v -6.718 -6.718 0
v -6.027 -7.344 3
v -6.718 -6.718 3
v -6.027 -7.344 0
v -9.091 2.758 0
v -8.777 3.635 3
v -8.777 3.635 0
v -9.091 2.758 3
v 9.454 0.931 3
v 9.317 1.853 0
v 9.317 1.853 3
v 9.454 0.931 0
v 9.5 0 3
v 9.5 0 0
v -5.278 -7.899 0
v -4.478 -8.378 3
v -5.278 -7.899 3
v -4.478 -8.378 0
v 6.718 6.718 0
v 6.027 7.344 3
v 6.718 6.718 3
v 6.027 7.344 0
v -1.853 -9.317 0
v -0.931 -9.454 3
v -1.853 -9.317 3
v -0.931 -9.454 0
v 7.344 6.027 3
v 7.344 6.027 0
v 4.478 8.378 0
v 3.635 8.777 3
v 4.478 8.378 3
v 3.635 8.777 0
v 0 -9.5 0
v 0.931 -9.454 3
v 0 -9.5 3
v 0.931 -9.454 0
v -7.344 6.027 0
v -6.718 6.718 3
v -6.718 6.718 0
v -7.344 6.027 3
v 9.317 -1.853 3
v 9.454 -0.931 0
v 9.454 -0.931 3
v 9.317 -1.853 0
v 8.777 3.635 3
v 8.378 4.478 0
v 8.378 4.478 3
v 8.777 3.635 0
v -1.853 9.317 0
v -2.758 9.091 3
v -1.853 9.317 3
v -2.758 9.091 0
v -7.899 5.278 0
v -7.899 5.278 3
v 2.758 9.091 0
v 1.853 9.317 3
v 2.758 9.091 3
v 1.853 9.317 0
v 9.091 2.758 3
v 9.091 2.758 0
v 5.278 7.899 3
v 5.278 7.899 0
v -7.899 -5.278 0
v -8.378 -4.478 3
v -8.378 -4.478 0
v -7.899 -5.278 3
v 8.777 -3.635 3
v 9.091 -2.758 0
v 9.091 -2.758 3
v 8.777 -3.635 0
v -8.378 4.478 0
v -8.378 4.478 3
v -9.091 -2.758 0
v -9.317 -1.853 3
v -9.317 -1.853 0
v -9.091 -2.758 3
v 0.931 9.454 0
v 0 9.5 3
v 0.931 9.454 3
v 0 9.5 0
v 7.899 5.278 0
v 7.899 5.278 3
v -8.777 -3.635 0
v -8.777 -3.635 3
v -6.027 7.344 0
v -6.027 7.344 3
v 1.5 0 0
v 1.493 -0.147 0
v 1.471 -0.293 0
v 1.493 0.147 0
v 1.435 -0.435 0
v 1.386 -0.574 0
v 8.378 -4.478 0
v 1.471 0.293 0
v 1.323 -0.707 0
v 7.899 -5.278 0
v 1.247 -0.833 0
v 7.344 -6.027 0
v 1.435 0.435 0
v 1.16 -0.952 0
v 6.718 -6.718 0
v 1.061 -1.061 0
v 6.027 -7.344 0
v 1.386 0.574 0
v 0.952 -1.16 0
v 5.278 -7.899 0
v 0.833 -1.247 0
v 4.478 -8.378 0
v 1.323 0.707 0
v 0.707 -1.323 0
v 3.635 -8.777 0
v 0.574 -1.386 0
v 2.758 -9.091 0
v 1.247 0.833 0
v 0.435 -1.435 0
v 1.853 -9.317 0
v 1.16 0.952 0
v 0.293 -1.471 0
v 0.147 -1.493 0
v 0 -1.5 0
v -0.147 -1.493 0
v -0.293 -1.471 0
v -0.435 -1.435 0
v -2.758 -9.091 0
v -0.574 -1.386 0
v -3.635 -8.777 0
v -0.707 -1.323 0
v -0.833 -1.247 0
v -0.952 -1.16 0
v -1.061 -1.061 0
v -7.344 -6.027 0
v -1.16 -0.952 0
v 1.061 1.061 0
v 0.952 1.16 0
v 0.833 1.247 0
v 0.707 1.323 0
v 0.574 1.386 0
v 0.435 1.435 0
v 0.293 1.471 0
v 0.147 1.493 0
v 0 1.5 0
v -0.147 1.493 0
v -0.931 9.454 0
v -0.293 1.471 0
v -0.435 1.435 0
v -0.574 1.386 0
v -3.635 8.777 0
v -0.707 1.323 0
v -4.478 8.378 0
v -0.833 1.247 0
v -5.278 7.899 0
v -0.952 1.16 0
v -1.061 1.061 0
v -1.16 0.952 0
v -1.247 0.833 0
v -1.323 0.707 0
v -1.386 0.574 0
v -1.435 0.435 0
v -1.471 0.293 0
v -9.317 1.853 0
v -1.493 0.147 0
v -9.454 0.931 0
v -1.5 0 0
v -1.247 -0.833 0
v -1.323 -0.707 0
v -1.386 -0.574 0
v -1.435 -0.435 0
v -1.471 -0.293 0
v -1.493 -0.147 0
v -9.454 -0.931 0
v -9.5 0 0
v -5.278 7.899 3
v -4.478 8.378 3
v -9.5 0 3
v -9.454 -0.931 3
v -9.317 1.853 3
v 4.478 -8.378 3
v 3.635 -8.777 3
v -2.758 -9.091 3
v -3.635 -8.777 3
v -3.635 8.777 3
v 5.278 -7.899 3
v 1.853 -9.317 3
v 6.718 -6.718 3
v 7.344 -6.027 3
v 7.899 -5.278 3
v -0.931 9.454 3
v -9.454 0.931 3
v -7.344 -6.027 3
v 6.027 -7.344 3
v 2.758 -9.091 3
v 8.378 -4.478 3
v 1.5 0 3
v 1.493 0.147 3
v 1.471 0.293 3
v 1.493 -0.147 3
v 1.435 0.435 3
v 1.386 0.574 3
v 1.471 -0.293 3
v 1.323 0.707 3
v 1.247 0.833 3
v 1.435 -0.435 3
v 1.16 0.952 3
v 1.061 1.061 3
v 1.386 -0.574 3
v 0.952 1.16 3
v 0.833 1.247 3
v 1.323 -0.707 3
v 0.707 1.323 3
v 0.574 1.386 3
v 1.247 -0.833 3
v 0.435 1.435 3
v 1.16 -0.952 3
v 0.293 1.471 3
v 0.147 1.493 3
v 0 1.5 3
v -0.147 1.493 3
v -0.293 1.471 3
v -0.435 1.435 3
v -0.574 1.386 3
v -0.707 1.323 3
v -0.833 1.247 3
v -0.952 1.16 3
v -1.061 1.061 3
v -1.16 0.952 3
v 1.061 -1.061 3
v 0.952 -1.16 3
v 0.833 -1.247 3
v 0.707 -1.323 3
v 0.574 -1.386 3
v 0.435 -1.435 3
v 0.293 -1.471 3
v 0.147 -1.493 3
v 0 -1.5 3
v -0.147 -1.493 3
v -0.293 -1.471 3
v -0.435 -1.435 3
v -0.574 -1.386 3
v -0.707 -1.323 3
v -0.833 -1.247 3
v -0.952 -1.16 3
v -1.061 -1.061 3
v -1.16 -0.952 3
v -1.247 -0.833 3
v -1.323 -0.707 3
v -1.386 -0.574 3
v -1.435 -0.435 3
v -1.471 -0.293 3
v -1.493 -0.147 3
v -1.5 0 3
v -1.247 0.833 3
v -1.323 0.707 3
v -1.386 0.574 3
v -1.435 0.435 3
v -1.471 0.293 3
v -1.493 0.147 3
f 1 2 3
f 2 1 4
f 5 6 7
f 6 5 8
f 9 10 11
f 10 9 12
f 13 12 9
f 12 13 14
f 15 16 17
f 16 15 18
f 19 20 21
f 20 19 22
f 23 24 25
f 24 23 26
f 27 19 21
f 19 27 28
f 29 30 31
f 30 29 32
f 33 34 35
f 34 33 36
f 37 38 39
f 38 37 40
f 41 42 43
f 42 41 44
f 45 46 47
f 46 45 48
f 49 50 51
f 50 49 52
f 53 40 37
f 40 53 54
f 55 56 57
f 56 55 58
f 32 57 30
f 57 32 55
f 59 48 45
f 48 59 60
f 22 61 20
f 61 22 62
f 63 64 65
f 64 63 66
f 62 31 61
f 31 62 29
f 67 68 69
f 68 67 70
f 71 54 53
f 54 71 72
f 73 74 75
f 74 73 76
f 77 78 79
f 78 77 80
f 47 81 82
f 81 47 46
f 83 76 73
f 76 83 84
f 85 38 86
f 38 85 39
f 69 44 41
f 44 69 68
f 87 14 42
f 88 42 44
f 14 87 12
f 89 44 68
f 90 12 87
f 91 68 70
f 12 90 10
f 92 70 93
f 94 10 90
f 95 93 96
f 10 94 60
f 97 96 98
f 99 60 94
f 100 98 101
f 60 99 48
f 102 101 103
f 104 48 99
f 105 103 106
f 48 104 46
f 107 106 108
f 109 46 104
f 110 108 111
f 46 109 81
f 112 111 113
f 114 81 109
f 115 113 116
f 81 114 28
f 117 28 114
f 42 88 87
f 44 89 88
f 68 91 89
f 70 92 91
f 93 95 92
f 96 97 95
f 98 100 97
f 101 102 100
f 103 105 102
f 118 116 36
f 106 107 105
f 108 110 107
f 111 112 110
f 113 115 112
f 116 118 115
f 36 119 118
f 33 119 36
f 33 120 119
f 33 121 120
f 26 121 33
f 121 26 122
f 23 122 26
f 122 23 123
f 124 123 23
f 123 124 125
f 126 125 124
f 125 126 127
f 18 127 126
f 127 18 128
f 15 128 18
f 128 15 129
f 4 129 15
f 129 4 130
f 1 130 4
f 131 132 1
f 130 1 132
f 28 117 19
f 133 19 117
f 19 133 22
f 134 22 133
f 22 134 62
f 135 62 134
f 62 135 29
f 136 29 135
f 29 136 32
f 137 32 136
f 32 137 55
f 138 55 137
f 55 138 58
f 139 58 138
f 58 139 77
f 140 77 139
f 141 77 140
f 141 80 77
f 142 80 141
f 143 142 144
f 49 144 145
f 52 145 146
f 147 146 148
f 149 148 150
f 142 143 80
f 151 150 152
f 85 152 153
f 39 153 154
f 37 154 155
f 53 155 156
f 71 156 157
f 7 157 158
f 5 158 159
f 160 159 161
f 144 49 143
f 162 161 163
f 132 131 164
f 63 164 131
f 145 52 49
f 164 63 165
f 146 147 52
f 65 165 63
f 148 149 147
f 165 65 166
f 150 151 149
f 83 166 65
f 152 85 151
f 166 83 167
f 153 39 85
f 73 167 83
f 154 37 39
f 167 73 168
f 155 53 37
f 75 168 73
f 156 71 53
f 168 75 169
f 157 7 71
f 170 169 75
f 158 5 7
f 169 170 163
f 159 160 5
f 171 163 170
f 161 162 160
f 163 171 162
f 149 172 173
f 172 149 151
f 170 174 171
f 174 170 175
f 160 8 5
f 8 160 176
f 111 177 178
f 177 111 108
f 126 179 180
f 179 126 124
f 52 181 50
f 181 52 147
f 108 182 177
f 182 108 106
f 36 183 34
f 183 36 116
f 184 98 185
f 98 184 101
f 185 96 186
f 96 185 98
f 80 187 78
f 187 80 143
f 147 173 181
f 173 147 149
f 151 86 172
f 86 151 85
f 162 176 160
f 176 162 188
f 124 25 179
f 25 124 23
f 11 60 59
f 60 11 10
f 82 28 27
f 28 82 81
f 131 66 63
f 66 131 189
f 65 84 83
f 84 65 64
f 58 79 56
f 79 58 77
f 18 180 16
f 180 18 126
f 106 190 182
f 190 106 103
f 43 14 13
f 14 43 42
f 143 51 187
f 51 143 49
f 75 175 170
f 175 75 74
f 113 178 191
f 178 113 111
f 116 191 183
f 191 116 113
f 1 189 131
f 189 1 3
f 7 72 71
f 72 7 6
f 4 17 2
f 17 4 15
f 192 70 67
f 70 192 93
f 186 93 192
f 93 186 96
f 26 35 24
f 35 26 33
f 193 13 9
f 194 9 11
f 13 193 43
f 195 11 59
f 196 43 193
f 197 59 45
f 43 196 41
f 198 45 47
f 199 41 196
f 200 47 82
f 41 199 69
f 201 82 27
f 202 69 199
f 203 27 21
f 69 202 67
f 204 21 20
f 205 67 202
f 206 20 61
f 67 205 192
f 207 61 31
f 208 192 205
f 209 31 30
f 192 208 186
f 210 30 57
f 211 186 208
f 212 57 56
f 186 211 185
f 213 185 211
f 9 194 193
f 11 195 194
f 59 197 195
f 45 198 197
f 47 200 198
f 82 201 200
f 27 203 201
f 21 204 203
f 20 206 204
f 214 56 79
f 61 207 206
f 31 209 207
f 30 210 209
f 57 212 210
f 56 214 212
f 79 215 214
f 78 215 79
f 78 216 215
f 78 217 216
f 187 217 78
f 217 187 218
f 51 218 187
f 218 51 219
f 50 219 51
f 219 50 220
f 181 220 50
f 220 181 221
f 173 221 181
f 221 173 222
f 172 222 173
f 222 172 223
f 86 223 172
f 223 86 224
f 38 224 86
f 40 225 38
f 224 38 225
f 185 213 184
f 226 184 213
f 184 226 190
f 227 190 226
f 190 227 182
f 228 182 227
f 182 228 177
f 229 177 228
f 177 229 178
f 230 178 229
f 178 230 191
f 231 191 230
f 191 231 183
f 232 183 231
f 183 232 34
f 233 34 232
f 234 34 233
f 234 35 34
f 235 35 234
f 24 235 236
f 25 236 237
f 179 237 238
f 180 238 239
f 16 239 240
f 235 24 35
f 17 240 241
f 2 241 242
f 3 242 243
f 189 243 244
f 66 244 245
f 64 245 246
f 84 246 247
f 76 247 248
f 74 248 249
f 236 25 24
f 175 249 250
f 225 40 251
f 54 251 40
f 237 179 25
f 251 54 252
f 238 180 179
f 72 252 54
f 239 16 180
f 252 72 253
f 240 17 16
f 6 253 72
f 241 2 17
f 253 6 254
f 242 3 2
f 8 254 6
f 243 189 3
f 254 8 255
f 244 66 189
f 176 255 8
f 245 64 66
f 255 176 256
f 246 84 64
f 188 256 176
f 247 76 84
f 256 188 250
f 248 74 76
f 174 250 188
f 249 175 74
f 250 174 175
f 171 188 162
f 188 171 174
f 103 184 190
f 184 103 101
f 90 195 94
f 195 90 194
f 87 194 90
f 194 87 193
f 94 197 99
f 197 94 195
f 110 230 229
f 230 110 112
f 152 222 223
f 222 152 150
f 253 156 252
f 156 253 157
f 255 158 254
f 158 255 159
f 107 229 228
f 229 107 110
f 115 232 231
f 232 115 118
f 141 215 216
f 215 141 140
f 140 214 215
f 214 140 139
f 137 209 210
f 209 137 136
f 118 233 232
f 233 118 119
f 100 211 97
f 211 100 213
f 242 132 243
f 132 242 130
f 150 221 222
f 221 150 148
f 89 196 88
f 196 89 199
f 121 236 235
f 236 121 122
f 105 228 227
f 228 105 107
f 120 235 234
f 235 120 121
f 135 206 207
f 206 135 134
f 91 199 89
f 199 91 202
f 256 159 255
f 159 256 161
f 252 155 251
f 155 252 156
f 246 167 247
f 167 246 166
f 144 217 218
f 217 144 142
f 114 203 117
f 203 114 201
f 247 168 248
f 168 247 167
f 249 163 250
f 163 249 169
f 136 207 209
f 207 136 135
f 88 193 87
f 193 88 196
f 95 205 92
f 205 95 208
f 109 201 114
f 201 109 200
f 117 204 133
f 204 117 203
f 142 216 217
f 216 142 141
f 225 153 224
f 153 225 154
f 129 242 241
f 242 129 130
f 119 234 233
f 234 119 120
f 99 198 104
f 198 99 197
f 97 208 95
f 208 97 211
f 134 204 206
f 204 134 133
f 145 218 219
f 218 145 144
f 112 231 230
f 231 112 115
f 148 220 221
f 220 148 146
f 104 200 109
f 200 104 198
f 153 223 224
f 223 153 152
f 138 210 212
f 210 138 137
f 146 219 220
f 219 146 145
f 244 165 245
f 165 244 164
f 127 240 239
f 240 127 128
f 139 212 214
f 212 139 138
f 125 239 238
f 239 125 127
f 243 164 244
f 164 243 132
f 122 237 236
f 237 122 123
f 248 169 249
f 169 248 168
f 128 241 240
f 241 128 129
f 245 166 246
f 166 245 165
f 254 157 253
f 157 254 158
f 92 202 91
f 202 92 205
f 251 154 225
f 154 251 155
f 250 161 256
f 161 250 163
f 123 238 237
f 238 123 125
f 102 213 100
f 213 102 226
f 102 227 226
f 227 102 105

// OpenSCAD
$fn=64;

d1=19;
d2=3;
h=3;

difference() {
  cylinder(d=d1, h=h);
  translate([0, 0, -0.1]) cylinder(d=d2, h=h+0.2);
}
